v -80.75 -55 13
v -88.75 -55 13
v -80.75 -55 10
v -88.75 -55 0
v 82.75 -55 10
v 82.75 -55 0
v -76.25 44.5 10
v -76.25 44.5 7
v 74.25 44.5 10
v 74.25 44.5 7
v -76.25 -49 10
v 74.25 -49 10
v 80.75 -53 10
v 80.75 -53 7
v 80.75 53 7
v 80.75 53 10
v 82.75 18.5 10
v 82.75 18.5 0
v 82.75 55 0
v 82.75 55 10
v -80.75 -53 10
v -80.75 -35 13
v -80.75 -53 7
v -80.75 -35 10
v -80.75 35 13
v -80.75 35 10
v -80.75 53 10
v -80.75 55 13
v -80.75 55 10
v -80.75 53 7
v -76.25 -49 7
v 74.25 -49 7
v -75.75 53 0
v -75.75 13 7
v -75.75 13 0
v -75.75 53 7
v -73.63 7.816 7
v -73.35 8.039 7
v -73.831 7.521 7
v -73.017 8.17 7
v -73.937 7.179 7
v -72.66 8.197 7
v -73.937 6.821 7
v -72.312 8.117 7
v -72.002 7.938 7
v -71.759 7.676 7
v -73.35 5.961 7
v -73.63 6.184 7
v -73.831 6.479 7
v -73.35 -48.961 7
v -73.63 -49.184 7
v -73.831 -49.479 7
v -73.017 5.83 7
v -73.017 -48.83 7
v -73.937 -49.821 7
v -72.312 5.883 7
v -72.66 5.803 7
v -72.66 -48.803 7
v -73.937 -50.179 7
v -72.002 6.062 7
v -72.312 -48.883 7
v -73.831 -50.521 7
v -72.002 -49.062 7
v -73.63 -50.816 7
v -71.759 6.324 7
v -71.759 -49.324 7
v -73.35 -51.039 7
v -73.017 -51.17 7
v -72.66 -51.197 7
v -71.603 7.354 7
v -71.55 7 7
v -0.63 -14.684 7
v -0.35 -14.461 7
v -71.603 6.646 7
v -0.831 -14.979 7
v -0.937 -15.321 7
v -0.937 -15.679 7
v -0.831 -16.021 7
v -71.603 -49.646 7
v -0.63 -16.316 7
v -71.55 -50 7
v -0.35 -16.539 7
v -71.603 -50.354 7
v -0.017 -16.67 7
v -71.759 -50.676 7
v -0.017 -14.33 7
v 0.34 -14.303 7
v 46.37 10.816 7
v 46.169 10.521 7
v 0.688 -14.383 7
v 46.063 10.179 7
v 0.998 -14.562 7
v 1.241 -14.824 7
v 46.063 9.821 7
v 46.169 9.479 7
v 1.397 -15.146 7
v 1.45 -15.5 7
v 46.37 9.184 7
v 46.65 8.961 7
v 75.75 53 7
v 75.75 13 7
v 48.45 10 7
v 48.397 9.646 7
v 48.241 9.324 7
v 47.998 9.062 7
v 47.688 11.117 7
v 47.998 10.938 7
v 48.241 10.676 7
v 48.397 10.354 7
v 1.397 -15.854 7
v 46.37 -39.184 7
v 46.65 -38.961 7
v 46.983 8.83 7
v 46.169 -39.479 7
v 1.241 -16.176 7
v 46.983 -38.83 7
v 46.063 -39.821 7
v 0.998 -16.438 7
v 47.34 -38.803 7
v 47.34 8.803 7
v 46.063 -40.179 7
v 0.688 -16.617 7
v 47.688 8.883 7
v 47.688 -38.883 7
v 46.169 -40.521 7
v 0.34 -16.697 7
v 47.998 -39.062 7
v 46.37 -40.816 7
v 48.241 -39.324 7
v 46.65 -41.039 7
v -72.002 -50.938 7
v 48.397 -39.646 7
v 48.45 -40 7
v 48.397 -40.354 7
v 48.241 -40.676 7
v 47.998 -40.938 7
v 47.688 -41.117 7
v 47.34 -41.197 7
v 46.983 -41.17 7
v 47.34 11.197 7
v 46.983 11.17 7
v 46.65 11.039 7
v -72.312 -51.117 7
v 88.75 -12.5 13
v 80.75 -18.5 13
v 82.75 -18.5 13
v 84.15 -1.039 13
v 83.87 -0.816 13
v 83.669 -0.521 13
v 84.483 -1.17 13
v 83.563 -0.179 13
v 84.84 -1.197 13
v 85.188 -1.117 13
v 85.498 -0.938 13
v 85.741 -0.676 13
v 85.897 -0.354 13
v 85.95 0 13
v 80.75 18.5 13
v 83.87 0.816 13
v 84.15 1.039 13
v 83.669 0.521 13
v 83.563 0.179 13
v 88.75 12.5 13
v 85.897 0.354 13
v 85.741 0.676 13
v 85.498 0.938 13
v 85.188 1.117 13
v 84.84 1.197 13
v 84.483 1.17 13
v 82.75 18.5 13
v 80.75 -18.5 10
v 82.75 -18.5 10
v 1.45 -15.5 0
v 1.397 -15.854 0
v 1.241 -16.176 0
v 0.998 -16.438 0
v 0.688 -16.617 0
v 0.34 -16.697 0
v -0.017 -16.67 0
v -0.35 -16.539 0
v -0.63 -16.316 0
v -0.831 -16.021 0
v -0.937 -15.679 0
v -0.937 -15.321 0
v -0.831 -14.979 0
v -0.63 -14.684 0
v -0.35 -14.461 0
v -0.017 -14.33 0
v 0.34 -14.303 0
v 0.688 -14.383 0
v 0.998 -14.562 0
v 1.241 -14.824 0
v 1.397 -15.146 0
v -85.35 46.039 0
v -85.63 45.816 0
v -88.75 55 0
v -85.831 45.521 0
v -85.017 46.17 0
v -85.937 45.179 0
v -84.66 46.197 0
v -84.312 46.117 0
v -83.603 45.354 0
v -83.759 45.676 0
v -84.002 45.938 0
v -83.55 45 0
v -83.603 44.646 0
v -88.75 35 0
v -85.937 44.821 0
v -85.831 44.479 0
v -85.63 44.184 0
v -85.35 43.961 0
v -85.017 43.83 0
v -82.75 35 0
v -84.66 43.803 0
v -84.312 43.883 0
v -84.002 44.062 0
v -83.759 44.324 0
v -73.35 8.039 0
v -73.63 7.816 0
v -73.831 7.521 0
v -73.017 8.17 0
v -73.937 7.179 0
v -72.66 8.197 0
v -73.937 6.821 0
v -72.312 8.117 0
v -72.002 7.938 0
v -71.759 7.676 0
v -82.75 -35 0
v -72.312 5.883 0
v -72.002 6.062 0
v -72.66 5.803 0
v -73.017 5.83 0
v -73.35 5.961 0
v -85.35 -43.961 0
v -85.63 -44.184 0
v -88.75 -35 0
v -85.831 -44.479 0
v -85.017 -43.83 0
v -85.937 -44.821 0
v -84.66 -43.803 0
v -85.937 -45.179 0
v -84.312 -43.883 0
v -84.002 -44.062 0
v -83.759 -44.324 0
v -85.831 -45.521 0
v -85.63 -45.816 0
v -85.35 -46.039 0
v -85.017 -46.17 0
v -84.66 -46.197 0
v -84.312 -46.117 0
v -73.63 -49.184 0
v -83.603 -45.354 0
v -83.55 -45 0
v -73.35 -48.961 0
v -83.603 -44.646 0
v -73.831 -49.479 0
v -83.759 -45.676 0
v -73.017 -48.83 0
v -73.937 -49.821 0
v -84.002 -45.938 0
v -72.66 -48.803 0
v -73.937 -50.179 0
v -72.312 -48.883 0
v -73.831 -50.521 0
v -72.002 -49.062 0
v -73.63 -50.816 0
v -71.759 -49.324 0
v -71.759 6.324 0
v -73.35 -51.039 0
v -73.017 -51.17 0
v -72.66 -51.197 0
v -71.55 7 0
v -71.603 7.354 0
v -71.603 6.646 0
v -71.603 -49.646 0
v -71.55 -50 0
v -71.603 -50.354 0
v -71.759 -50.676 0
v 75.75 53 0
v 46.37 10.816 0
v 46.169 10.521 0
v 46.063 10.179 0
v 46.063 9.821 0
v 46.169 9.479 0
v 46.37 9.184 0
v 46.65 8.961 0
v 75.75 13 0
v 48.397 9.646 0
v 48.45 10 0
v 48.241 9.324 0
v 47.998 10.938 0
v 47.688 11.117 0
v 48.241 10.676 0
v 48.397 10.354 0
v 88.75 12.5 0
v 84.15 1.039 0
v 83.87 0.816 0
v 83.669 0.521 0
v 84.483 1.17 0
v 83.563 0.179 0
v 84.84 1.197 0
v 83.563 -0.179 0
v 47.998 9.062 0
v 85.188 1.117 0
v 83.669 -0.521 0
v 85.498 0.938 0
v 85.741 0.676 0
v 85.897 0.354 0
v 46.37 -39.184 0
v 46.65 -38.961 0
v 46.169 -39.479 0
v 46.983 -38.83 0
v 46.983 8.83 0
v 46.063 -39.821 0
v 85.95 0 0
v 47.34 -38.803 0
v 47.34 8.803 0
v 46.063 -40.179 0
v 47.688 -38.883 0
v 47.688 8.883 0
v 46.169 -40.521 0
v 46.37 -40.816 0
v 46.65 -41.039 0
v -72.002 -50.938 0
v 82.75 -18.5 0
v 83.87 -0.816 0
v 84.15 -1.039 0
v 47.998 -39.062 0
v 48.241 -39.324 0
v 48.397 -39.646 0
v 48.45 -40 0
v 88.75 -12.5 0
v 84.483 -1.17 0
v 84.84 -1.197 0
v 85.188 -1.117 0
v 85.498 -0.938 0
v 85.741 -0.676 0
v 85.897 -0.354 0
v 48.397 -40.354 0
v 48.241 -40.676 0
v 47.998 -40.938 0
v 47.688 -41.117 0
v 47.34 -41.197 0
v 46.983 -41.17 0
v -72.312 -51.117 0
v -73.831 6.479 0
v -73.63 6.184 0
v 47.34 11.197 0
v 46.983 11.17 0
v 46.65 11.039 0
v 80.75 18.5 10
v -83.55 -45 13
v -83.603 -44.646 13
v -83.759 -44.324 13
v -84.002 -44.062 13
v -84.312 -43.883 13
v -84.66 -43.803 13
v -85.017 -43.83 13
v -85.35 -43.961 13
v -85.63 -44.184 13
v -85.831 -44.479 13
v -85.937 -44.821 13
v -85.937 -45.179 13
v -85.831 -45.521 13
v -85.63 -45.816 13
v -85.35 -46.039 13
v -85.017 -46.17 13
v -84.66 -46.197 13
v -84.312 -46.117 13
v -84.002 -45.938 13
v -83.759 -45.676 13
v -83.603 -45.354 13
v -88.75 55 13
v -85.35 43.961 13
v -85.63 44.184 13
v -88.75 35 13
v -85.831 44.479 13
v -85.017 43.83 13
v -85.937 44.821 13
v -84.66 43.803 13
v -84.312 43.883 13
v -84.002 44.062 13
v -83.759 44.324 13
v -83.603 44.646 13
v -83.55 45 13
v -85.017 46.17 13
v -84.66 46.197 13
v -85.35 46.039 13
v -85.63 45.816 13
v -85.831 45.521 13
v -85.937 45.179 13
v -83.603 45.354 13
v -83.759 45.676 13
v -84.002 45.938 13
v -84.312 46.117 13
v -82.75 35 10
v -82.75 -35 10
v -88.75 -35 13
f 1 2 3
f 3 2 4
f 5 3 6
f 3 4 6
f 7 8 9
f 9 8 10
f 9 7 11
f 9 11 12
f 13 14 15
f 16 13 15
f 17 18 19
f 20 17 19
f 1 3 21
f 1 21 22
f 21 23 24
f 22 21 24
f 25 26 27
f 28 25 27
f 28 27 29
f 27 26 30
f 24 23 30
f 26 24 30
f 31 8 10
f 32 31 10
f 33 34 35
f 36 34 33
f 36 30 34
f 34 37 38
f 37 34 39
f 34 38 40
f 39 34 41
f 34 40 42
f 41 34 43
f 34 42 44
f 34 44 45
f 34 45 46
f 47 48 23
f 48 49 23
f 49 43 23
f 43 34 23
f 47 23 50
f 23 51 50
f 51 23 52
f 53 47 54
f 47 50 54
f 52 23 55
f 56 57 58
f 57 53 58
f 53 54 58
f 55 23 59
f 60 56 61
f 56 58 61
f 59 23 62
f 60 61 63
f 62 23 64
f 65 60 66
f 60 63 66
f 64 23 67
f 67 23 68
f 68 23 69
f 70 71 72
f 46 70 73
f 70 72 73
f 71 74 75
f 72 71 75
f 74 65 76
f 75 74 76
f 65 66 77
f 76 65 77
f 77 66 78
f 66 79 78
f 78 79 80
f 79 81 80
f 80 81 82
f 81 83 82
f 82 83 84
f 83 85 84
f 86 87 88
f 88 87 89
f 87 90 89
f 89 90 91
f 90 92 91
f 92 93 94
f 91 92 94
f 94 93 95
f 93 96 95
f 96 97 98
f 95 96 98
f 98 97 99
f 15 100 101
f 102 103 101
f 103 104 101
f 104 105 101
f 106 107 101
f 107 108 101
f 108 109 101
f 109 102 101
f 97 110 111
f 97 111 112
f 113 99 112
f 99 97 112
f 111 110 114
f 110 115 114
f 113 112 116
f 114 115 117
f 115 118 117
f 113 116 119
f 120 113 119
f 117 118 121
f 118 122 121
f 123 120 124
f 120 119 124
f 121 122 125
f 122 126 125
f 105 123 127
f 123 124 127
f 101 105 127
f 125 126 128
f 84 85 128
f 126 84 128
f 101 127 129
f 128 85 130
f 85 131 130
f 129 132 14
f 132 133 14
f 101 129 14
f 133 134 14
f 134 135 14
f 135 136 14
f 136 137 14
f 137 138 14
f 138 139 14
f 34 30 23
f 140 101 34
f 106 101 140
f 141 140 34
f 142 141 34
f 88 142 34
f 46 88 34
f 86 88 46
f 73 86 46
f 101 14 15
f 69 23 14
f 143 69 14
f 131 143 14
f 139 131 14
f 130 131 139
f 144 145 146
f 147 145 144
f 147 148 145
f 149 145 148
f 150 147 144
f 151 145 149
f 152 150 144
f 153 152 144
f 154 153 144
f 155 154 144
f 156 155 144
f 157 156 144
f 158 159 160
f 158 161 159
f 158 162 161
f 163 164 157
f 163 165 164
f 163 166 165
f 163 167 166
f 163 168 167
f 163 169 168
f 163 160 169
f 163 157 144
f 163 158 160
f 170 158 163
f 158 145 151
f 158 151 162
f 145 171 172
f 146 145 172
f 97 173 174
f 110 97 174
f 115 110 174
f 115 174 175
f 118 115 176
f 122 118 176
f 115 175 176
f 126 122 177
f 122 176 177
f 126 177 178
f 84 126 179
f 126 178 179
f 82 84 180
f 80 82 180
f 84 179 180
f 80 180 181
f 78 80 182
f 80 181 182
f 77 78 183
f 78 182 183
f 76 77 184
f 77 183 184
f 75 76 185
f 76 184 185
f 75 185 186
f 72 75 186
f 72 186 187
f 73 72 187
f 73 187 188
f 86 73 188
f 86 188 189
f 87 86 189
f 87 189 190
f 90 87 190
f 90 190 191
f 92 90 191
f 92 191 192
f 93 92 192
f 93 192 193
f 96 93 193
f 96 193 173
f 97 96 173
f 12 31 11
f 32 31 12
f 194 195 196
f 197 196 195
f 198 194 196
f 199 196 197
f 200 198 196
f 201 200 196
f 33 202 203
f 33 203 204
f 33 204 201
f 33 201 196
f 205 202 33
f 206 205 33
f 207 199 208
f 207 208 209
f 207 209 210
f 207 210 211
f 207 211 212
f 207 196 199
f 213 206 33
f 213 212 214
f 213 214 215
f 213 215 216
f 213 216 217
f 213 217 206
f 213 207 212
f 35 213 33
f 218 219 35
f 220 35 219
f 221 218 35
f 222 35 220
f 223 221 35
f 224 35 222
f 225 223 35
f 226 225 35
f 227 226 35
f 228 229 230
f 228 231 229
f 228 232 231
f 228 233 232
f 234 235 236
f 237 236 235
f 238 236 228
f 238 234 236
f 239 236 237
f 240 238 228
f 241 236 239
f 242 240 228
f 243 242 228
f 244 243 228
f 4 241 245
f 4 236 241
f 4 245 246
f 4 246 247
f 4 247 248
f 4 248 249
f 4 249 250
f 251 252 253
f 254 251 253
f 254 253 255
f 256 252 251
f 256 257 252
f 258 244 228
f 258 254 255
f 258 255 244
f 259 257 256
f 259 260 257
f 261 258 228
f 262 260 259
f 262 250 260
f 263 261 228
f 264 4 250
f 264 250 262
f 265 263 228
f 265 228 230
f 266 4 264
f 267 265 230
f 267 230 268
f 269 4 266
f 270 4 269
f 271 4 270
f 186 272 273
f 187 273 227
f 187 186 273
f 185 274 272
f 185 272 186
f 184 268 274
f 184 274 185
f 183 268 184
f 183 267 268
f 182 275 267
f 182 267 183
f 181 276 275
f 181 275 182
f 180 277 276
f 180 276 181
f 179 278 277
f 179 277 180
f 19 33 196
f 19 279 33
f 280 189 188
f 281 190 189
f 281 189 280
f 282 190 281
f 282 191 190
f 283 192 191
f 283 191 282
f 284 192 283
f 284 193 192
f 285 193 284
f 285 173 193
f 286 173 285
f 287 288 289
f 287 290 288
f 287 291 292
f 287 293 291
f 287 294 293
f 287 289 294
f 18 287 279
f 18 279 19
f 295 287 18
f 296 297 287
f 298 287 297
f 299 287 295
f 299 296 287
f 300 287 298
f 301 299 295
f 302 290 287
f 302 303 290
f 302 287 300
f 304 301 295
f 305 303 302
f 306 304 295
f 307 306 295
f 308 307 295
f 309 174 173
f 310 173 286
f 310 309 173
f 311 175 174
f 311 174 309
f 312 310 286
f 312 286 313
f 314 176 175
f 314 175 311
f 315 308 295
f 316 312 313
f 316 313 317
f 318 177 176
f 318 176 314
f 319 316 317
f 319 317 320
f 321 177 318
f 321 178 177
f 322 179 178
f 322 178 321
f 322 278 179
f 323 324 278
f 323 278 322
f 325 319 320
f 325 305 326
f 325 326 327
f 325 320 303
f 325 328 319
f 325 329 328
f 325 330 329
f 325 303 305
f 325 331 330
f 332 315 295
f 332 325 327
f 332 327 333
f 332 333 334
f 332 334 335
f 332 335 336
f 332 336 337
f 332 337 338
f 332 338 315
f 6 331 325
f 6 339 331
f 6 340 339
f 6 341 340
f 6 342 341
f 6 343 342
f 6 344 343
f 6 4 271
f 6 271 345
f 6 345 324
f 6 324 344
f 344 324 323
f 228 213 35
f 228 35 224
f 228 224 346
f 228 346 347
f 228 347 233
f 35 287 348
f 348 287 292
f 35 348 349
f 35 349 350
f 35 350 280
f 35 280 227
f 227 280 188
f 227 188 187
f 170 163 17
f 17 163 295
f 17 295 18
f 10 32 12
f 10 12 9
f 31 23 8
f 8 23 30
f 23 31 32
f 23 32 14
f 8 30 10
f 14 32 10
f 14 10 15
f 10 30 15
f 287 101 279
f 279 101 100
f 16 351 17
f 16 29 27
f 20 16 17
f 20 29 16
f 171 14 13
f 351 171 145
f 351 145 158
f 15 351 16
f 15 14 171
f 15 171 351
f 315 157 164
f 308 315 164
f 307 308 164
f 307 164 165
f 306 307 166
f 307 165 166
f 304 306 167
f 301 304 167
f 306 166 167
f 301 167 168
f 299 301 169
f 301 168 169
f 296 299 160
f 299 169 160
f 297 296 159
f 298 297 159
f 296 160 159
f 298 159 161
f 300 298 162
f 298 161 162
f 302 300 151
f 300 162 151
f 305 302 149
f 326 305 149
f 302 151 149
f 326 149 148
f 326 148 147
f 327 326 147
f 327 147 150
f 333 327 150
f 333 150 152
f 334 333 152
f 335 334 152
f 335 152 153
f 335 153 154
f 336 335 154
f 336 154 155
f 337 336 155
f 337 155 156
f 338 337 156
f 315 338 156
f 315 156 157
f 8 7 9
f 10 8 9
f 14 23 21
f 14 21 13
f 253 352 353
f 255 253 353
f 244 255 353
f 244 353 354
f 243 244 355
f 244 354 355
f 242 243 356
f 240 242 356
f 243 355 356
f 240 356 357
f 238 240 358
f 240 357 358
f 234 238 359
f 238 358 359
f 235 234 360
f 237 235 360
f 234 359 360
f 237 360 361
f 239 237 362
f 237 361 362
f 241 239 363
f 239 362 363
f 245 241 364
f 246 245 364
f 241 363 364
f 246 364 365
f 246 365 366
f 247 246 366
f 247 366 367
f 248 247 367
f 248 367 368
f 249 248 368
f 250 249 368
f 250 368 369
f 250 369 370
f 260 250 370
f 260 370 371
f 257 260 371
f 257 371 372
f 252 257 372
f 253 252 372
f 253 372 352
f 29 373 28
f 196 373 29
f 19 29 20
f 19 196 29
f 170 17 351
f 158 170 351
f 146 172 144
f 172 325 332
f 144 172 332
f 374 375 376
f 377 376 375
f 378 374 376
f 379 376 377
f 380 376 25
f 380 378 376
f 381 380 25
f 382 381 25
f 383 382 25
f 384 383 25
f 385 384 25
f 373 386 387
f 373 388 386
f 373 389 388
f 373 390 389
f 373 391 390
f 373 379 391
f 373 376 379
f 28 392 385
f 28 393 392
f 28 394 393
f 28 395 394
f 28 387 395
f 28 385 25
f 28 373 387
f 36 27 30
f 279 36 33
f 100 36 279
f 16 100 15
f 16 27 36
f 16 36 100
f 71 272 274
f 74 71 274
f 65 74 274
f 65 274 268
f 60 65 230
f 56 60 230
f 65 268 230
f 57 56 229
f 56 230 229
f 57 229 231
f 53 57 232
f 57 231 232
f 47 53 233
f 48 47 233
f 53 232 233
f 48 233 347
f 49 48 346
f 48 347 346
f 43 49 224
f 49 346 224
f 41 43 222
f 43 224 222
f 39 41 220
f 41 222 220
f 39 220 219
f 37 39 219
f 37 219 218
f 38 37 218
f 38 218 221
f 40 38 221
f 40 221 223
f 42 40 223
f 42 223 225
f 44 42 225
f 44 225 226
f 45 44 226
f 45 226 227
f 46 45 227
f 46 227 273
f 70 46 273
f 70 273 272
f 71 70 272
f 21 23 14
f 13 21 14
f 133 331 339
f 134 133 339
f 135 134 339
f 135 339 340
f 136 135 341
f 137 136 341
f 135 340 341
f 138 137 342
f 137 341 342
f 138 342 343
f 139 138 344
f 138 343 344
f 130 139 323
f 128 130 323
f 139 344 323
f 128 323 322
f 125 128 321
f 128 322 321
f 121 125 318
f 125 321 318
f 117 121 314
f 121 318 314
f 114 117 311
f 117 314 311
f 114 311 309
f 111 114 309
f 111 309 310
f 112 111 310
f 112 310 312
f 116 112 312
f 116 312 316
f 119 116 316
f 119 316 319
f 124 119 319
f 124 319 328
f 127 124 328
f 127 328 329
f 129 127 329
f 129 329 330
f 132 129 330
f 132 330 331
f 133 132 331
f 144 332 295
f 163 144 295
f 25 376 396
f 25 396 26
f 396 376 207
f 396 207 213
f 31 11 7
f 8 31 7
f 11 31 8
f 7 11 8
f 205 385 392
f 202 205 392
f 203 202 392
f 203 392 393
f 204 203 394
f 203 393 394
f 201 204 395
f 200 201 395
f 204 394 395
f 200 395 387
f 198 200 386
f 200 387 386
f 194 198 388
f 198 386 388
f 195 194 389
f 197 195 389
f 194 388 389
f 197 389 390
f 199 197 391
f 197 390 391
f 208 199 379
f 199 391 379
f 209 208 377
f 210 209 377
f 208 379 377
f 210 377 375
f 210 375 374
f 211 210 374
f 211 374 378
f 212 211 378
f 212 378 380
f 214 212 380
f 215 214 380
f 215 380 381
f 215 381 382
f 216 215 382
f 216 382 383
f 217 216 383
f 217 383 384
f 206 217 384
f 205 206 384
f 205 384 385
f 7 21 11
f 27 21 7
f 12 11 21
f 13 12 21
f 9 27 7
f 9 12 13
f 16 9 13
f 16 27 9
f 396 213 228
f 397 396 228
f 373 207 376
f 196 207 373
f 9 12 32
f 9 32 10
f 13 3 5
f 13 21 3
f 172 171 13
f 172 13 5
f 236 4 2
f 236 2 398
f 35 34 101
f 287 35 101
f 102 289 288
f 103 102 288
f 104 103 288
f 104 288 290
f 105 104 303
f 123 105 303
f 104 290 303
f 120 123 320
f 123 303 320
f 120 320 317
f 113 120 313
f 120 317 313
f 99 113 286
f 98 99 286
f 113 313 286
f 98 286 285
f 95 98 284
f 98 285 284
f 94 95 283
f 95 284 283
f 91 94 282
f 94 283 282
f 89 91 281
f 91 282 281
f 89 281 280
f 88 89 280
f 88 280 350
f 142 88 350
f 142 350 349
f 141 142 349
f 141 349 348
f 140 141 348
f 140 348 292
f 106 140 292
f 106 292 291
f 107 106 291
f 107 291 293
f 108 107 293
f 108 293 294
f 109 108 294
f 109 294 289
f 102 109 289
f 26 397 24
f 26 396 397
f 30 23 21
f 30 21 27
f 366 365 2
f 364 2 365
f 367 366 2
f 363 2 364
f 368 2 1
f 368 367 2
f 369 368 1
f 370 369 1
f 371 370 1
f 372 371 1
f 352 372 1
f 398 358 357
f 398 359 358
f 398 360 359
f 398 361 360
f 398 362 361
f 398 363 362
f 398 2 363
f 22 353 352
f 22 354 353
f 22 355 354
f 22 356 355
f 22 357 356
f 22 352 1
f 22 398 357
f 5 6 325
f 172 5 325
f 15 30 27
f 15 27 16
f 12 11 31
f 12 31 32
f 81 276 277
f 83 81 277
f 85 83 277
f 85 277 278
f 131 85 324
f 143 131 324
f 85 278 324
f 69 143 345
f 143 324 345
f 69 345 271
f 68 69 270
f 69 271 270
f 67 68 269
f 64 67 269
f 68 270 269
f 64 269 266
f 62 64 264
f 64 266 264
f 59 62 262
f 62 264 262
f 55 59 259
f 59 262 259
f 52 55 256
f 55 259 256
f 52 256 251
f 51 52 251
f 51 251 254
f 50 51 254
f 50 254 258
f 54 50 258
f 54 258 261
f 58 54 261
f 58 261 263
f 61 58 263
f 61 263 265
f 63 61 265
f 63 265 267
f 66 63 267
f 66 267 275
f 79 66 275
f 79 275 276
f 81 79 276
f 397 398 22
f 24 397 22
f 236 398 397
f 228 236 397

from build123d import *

# Parameters (mm, degrees)
F0_W      = 161.5
F0_H      = 106
F0_W_2    = 6
F0_H_2    = 20
F1_DEPTH  = 10
F2_W      = 161.5
F2_H      = 106
F3_DEPTH  = 7
F4_W      = 151.5
F4_H      = 40
F5_DEPTH  = 25
F6_W      = 161.5
F6_H      = 106
F6_W_2    = 150.5
F6_H_2    = 93.5
F7_DEPTH  = 3
F8_W      = 150.5
F8_H      = 93.5
F9_DEPTH  = 3
F10_W     = 8
F10_H     = 20
F11_DEPTH = 3
F12_R     = 1.2
F13_DEPTH = 25
F14_R     = 1.2
F15_DEPTH = 25


with BuildPart() as f1:
    # F0 (on Top) → F1 (new body)
    with BuildSketch(Plane.XY):
        Polygon((-82.75, -55), (82.75, -55), (82.75, -18.5), (82.75, 18.5), (82.75, 55), (-82.75, 55), (-82.75, 35), (-82.75, -35), align=None)
        Rectangle(F0_W, F0_H, mode=Mode.SUBTRACT)
        with Locations((-85.75, -45)):
            Rectangle(F0_W_2, F0_H_2)
        Polygon((82.75, 18.5), (82.75, -18.5), (88.75, -12.5), (88.75, 12.5), align=None)
        with Locations((-85.75, 45)):
            Rectangle(F0_W_2, F0_H_2)
    extrude(amount=F1_DEPTH)

    # F2 (on face) → F3 (join)
    with BuildSketch(Plane(origin=(0, 0, 0), x_dir=(1, 0, 0), z_dir=(0, 0, -1))):
        Rectangle(F2_W, F2_H)
    extrude(amount=-F3_DEPTH)

    # F4 (on face) → F5 (cut)
    with BuildSketch(Plane.XY.offset(7)):
        with Locations((0, 33)):
            Rectangle(F4_W, F4_H)
    extrude(amount=-F5_DEPTH, mode=Mode.SUBTRACT)

    # F10 (on face) → F11 (join)
    with BuildSketch(Plane.XY.offset(10)):
        with Locations((-84.75, 45)):
            Rectangle(F10_W, F10_H)
        with Locations((-84.75, -45)):
            Rectangle(F10_W, F10_H)
        Polygon((88.75, 12.5), (82.75, 18.5), (80.75, 18.5), (80.75, -18.5), (82.75, -18.5), (88.75, -12.5), align=None)
    extrude(amount=F11_DEPTH)

    # F12 (on face) → F13 (cut)
    with BuildSketch(Plane.XY.offset(13)):
        with Locations((-84.75, 45)):
            Circle(F12_R)
        with Locations((84.75, 0)):
            Circle(F12_R)
        with Locations((-84.75, -45)):
            Circle(F12_R)
    extrude(amount=-F13_DEPTH, mode=Mode.SUBTRACT)

    # F14 (on face) → F15 (cut)
    with BuildSketch(Plane(origin=(0, 0, 0), x_dir=(1, 0, 0), z_dir=(0, 0, -1))):
        with Locations((-72.75, 50)):
            Circle(F14_R)
        with Locations((-72.75, -7)):
            Circle(F14_R)
        with Locations((47.25, 40)):
            Circle(F14_R)
        with Locations((47.25, -10)):
            Circle(F14_R)
        with Locations((0.25, 15.5)):
            Circle(F14_R)
    extrude(amount=-F15_DEPTH, mode=Mode.SUBTRACT)


with BuildPart() as f7:
    # F6 (on face) → F7 (new body)
    with BuildSketch(Plane.XY.offset(7)):
        Rectangle(F6_W, F6_H)
        with Locations((-1, -2.25)):
            Rectangle(F6_W_2, F6_H_2, mode=Mode.SUBTRACT)
    extrude(amount=F7_DEPTH)


with BuildPart() as f9:
    # F8 (on face) → F9 (new body)
    with BuildSketch(Plane.XY.offset(10)):
        with Locations((-1, -2.25)):
            Rectangle(F8_W, F8_H)
    extrude(amount=-F9_DEPTH)


solid = Compound([f1.part, f7.part, f9.part])
